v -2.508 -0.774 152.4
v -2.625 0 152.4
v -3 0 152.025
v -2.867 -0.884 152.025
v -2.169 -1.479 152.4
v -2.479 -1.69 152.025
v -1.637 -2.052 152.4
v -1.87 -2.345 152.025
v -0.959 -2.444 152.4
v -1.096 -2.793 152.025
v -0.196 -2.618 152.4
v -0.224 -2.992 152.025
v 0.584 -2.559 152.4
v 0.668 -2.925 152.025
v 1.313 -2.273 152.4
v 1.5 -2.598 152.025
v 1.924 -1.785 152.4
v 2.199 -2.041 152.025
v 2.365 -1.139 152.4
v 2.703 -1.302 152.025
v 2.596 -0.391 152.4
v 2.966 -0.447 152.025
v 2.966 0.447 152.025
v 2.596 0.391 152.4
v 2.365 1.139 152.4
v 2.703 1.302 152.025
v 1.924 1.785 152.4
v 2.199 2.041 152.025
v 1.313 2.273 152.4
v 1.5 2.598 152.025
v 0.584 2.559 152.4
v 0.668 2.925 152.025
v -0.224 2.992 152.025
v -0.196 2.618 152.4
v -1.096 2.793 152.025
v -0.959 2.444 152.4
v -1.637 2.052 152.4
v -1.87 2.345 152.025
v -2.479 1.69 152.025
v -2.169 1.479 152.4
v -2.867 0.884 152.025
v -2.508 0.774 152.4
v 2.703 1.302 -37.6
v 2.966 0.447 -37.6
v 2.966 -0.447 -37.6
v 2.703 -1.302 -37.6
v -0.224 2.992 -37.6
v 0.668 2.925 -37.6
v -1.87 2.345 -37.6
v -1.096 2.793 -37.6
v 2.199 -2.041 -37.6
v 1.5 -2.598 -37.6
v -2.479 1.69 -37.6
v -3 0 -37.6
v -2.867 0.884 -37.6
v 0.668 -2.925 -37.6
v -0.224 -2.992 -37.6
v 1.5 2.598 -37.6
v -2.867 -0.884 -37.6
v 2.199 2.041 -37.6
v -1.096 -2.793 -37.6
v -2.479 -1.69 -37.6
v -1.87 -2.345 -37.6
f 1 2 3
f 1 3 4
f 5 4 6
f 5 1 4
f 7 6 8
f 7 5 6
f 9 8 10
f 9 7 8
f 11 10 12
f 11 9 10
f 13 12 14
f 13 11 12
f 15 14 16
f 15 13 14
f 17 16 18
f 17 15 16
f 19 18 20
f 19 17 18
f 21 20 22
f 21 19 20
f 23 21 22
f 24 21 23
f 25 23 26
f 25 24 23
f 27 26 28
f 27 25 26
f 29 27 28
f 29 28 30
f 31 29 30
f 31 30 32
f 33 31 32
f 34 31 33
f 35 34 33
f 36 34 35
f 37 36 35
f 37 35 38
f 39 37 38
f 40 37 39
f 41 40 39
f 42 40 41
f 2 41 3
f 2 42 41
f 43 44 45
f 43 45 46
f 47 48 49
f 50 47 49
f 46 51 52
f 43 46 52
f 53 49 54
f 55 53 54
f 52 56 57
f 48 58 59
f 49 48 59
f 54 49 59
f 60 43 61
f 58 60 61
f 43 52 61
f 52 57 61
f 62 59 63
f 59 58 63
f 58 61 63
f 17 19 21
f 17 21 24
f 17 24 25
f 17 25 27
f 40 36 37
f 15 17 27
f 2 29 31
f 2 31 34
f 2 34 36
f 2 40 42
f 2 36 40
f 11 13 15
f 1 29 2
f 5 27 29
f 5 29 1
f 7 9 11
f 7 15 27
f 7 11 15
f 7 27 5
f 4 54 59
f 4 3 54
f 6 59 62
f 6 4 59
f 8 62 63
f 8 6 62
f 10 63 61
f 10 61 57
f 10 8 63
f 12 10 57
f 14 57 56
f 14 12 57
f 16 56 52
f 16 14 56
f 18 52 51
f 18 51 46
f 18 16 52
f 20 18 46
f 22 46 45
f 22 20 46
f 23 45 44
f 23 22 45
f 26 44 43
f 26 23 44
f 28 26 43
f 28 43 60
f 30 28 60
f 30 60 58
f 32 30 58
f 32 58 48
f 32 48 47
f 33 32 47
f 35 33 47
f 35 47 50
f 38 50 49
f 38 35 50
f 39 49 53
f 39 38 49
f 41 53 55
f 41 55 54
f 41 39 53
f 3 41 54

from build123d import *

# Parameters (mm, degrees)
SKETCH3_R           = 3
BOSS_EXTRUDE1_DEPTH = 152.4
CHAMFER1_SIZE       = 0.375
SKETCH4_R           = 3
CUT_EXTRUDE1_DEPTH  = 191.047362518


with BuildPart() as part:
    # Sketch3 → Boss-Extrude1 (new, symmetric)
    with BuildSketch(Plane.XY):
        with Locations(Location((0, 0, 0), (0, 0, 180))):
            Circle(SKETCH3_R)
    extrude(amount=BOSS_EXTRUDE1_DEPTH, both=True)

    # Chamfer1
    chamfer1_edges = [part.edges().sort_by_distance(p)[0] for p in [
        (3, 0, -152.4),
        (3, 0, 152.4),
    ]]
    chamfer(chamfer1_edges, length=CHAMFER1_SIZE)

    # Sketch4 → Cut-Extrude1 (cut, through all)
    with BuildSketch(Plane.XY.offset(-37.6)):
        with Locations(Location((0, 0, 0), (0, 0, 180))):
            Circle(SKETCH4_R)
    extrude(amount=-CUT_EXTRUDE1_DEPTH, mode=Mode.SUBTRACT)


solid = part.part
